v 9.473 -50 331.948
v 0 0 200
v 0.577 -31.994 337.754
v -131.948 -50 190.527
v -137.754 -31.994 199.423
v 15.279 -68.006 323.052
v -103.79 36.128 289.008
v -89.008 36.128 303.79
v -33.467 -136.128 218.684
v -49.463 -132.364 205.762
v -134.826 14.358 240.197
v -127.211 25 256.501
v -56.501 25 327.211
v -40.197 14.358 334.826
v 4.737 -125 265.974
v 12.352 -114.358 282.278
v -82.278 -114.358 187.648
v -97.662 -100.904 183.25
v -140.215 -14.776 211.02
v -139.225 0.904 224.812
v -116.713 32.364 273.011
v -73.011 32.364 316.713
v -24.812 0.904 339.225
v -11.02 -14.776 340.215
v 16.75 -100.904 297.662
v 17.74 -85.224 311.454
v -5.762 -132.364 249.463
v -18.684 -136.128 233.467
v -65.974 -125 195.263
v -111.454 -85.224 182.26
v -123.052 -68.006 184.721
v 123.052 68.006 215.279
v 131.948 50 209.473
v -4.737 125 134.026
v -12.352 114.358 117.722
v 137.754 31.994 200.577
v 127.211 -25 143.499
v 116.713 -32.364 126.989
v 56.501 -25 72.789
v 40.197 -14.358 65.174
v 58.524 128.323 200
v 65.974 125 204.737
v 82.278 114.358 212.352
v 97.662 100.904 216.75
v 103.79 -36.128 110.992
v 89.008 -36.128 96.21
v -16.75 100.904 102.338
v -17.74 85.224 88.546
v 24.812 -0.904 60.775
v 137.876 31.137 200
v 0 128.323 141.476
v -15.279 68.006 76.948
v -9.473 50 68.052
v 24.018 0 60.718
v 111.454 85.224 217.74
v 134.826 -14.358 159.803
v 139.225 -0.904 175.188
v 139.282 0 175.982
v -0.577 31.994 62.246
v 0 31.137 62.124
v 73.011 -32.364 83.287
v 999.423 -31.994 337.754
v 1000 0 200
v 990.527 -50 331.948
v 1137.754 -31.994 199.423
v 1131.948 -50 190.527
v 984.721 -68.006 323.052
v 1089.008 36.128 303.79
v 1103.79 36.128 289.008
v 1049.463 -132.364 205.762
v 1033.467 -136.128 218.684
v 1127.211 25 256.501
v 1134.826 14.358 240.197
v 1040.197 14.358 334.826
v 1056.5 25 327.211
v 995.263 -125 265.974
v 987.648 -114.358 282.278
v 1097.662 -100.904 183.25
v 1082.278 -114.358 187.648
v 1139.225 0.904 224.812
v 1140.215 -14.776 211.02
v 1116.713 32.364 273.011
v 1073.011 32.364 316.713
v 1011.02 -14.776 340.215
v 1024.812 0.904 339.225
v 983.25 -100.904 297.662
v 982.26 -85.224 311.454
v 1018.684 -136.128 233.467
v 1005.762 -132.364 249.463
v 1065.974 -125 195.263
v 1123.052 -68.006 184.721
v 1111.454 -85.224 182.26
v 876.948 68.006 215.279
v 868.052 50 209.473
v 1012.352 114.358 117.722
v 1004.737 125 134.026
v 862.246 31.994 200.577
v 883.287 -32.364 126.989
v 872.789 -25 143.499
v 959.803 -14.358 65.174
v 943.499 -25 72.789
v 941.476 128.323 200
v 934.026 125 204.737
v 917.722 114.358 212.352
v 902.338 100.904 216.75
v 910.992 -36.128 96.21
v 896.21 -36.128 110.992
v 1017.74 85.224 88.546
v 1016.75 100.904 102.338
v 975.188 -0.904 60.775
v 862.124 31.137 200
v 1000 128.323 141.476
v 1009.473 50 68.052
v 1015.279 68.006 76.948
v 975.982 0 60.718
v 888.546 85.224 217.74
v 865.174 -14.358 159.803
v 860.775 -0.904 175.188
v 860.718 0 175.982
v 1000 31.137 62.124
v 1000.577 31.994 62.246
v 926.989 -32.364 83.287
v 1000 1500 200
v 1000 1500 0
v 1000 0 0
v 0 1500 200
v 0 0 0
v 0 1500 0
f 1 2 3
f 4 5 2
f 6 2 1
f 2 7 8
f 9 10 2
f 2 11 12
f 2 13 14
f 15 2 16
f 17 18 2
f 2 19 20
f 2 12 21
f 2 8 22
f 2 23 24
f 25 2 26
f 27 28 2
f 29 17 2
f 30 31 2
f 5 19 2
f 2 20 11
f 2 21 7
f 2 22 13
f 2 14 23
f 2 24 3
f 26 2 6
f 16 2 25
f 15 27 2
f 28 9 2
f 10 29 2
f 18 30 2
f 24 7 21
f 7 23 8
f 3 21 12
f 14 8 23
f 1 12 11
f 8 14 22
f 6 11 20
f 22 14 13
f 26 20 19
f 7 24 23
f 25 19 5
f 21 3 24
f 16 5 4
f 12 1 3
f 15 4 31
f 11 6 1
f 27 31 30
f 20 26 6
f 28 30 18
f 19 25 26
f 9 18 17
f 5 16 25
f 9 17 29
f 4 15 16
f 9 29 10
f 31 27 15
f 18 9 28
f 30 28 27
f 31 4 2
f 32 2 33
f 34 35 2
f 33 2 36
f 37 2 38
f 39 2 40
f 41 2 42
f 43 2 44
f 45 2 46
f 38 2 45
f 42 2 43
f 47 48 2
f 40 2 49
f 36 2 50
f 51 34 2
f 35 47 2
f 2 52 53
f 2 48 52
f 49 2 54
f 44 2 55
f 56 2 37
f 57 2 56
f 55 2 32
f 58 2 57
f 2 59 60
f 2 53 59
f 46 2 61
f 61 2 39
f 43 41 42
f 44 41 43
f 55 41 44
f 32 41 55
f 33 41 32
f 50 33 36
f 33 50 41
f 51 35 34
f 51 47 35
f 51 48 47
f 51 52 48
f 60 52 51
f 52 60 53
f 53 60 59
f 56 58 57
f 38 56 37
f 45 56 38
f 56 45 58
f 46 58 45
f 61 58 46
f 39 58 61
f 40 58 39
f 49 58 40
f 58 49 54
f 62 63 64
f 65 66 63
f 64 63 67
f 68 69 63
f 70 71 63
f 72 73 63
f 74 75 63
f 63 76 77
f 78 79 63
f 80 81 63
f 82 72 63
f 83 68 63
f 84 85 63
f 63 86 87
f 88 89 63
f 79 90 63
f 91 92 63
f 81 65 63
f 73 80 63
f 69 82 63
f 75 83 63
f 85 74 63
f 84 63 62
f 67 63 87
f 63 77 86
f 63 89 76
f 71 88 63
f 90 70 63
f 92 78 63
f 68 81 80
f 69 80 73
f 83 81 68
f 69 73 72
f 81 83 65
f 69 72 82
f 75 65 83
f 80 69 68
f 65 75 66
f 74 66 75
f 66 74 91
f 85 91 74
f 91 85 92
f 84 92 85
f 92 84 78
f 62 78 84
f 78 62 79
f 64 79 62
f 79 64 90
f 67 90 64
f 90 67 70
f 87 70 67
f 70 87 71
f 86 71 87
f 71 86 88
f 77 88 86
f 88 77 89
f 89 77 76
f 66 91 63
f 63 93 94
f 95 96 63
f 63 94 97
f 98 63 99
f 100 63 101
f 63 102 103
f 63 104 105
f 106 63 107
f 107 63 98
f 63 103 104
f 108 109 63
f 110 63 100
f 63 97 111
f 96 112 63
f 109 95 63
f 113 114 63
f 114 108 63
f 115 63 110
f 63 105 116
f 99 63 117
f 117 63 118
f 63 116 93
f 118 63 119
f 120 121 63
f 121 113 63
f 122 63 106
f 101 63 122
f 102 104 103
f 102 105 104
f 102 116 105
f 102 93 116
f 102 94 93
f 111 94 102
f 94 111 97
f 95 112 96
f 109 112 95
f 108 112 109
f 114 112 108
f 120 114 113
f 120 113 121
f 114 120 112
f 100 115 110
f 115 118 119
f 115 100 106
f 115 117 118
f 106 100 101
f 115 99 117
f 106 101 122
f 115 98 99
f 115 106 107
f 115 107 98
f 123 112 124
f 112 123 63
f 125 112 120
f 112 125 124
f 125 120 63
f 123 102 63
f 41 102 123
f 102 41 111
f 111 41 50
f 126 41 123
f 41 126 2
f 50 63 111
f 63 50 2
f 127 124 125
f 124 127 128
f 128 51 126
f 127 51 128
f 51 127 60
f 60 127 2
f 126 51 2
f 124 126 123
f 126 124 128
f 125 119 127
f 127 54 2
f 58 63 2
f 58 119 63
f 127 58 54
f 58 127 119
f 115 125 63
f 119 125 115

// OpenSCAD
module lidar() {

cylinder(h =100, d1=0, d=200);

mirror([0,0,1])
cylinder(h =100, d1=0, d=200);

}


cube([1000,1500,200]);


translate([0,0,200])
rotate([30,-45,0])
lidar();



translate([1000,0,0])
mirror([1,0,0])
translate([0,0,200])
rotate([30,-45,0])
lidar();
